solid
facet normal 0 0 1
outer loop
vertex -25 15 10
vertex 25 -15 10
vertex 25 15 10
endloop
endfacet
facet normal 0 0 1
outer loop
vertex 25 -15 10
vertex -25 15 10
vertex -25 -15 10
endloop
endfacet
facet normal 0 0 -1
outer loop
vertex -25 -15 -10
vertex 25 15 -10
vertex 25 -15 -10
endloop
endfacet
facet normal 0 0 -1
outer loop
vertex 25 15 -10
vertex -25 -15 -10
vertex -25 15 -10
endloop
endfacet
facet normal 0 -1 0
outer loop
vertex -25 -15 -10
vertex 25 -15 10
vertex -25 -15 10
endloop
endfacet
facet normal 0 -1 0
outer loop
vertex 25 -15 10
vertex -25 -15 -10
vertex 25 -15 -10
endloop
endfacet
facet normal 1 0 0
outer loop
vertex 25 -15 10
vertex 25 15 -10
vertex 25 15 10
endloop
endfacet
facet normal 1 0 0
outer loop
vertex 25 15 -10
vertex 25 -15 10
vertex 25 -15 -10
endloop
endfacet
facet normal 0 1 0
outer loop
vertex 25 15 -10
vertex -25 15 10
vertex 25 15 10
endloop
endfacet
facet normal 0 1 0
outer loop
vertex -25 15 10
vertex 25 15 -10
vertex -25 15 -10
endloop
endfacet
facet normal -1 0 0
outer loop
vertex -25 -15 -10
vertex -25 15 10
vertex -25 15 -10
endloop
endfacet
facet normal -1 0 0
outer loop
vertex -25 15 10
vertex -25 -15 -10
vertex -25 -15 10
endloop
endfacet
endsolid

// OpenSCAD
// Parameters
body_length = 50; //[25:100:1]
body_width  = 30; //[15:60:1]
body_height = 20; //[10:40:1]

// Ensure robust, non-degenerate geometry
eps = 0.01;

// Main Body Module
module main_body() {
  cube([body_length, body_width, body_height], center=true);
}

// Final Model (one connected solid)
main_body();
